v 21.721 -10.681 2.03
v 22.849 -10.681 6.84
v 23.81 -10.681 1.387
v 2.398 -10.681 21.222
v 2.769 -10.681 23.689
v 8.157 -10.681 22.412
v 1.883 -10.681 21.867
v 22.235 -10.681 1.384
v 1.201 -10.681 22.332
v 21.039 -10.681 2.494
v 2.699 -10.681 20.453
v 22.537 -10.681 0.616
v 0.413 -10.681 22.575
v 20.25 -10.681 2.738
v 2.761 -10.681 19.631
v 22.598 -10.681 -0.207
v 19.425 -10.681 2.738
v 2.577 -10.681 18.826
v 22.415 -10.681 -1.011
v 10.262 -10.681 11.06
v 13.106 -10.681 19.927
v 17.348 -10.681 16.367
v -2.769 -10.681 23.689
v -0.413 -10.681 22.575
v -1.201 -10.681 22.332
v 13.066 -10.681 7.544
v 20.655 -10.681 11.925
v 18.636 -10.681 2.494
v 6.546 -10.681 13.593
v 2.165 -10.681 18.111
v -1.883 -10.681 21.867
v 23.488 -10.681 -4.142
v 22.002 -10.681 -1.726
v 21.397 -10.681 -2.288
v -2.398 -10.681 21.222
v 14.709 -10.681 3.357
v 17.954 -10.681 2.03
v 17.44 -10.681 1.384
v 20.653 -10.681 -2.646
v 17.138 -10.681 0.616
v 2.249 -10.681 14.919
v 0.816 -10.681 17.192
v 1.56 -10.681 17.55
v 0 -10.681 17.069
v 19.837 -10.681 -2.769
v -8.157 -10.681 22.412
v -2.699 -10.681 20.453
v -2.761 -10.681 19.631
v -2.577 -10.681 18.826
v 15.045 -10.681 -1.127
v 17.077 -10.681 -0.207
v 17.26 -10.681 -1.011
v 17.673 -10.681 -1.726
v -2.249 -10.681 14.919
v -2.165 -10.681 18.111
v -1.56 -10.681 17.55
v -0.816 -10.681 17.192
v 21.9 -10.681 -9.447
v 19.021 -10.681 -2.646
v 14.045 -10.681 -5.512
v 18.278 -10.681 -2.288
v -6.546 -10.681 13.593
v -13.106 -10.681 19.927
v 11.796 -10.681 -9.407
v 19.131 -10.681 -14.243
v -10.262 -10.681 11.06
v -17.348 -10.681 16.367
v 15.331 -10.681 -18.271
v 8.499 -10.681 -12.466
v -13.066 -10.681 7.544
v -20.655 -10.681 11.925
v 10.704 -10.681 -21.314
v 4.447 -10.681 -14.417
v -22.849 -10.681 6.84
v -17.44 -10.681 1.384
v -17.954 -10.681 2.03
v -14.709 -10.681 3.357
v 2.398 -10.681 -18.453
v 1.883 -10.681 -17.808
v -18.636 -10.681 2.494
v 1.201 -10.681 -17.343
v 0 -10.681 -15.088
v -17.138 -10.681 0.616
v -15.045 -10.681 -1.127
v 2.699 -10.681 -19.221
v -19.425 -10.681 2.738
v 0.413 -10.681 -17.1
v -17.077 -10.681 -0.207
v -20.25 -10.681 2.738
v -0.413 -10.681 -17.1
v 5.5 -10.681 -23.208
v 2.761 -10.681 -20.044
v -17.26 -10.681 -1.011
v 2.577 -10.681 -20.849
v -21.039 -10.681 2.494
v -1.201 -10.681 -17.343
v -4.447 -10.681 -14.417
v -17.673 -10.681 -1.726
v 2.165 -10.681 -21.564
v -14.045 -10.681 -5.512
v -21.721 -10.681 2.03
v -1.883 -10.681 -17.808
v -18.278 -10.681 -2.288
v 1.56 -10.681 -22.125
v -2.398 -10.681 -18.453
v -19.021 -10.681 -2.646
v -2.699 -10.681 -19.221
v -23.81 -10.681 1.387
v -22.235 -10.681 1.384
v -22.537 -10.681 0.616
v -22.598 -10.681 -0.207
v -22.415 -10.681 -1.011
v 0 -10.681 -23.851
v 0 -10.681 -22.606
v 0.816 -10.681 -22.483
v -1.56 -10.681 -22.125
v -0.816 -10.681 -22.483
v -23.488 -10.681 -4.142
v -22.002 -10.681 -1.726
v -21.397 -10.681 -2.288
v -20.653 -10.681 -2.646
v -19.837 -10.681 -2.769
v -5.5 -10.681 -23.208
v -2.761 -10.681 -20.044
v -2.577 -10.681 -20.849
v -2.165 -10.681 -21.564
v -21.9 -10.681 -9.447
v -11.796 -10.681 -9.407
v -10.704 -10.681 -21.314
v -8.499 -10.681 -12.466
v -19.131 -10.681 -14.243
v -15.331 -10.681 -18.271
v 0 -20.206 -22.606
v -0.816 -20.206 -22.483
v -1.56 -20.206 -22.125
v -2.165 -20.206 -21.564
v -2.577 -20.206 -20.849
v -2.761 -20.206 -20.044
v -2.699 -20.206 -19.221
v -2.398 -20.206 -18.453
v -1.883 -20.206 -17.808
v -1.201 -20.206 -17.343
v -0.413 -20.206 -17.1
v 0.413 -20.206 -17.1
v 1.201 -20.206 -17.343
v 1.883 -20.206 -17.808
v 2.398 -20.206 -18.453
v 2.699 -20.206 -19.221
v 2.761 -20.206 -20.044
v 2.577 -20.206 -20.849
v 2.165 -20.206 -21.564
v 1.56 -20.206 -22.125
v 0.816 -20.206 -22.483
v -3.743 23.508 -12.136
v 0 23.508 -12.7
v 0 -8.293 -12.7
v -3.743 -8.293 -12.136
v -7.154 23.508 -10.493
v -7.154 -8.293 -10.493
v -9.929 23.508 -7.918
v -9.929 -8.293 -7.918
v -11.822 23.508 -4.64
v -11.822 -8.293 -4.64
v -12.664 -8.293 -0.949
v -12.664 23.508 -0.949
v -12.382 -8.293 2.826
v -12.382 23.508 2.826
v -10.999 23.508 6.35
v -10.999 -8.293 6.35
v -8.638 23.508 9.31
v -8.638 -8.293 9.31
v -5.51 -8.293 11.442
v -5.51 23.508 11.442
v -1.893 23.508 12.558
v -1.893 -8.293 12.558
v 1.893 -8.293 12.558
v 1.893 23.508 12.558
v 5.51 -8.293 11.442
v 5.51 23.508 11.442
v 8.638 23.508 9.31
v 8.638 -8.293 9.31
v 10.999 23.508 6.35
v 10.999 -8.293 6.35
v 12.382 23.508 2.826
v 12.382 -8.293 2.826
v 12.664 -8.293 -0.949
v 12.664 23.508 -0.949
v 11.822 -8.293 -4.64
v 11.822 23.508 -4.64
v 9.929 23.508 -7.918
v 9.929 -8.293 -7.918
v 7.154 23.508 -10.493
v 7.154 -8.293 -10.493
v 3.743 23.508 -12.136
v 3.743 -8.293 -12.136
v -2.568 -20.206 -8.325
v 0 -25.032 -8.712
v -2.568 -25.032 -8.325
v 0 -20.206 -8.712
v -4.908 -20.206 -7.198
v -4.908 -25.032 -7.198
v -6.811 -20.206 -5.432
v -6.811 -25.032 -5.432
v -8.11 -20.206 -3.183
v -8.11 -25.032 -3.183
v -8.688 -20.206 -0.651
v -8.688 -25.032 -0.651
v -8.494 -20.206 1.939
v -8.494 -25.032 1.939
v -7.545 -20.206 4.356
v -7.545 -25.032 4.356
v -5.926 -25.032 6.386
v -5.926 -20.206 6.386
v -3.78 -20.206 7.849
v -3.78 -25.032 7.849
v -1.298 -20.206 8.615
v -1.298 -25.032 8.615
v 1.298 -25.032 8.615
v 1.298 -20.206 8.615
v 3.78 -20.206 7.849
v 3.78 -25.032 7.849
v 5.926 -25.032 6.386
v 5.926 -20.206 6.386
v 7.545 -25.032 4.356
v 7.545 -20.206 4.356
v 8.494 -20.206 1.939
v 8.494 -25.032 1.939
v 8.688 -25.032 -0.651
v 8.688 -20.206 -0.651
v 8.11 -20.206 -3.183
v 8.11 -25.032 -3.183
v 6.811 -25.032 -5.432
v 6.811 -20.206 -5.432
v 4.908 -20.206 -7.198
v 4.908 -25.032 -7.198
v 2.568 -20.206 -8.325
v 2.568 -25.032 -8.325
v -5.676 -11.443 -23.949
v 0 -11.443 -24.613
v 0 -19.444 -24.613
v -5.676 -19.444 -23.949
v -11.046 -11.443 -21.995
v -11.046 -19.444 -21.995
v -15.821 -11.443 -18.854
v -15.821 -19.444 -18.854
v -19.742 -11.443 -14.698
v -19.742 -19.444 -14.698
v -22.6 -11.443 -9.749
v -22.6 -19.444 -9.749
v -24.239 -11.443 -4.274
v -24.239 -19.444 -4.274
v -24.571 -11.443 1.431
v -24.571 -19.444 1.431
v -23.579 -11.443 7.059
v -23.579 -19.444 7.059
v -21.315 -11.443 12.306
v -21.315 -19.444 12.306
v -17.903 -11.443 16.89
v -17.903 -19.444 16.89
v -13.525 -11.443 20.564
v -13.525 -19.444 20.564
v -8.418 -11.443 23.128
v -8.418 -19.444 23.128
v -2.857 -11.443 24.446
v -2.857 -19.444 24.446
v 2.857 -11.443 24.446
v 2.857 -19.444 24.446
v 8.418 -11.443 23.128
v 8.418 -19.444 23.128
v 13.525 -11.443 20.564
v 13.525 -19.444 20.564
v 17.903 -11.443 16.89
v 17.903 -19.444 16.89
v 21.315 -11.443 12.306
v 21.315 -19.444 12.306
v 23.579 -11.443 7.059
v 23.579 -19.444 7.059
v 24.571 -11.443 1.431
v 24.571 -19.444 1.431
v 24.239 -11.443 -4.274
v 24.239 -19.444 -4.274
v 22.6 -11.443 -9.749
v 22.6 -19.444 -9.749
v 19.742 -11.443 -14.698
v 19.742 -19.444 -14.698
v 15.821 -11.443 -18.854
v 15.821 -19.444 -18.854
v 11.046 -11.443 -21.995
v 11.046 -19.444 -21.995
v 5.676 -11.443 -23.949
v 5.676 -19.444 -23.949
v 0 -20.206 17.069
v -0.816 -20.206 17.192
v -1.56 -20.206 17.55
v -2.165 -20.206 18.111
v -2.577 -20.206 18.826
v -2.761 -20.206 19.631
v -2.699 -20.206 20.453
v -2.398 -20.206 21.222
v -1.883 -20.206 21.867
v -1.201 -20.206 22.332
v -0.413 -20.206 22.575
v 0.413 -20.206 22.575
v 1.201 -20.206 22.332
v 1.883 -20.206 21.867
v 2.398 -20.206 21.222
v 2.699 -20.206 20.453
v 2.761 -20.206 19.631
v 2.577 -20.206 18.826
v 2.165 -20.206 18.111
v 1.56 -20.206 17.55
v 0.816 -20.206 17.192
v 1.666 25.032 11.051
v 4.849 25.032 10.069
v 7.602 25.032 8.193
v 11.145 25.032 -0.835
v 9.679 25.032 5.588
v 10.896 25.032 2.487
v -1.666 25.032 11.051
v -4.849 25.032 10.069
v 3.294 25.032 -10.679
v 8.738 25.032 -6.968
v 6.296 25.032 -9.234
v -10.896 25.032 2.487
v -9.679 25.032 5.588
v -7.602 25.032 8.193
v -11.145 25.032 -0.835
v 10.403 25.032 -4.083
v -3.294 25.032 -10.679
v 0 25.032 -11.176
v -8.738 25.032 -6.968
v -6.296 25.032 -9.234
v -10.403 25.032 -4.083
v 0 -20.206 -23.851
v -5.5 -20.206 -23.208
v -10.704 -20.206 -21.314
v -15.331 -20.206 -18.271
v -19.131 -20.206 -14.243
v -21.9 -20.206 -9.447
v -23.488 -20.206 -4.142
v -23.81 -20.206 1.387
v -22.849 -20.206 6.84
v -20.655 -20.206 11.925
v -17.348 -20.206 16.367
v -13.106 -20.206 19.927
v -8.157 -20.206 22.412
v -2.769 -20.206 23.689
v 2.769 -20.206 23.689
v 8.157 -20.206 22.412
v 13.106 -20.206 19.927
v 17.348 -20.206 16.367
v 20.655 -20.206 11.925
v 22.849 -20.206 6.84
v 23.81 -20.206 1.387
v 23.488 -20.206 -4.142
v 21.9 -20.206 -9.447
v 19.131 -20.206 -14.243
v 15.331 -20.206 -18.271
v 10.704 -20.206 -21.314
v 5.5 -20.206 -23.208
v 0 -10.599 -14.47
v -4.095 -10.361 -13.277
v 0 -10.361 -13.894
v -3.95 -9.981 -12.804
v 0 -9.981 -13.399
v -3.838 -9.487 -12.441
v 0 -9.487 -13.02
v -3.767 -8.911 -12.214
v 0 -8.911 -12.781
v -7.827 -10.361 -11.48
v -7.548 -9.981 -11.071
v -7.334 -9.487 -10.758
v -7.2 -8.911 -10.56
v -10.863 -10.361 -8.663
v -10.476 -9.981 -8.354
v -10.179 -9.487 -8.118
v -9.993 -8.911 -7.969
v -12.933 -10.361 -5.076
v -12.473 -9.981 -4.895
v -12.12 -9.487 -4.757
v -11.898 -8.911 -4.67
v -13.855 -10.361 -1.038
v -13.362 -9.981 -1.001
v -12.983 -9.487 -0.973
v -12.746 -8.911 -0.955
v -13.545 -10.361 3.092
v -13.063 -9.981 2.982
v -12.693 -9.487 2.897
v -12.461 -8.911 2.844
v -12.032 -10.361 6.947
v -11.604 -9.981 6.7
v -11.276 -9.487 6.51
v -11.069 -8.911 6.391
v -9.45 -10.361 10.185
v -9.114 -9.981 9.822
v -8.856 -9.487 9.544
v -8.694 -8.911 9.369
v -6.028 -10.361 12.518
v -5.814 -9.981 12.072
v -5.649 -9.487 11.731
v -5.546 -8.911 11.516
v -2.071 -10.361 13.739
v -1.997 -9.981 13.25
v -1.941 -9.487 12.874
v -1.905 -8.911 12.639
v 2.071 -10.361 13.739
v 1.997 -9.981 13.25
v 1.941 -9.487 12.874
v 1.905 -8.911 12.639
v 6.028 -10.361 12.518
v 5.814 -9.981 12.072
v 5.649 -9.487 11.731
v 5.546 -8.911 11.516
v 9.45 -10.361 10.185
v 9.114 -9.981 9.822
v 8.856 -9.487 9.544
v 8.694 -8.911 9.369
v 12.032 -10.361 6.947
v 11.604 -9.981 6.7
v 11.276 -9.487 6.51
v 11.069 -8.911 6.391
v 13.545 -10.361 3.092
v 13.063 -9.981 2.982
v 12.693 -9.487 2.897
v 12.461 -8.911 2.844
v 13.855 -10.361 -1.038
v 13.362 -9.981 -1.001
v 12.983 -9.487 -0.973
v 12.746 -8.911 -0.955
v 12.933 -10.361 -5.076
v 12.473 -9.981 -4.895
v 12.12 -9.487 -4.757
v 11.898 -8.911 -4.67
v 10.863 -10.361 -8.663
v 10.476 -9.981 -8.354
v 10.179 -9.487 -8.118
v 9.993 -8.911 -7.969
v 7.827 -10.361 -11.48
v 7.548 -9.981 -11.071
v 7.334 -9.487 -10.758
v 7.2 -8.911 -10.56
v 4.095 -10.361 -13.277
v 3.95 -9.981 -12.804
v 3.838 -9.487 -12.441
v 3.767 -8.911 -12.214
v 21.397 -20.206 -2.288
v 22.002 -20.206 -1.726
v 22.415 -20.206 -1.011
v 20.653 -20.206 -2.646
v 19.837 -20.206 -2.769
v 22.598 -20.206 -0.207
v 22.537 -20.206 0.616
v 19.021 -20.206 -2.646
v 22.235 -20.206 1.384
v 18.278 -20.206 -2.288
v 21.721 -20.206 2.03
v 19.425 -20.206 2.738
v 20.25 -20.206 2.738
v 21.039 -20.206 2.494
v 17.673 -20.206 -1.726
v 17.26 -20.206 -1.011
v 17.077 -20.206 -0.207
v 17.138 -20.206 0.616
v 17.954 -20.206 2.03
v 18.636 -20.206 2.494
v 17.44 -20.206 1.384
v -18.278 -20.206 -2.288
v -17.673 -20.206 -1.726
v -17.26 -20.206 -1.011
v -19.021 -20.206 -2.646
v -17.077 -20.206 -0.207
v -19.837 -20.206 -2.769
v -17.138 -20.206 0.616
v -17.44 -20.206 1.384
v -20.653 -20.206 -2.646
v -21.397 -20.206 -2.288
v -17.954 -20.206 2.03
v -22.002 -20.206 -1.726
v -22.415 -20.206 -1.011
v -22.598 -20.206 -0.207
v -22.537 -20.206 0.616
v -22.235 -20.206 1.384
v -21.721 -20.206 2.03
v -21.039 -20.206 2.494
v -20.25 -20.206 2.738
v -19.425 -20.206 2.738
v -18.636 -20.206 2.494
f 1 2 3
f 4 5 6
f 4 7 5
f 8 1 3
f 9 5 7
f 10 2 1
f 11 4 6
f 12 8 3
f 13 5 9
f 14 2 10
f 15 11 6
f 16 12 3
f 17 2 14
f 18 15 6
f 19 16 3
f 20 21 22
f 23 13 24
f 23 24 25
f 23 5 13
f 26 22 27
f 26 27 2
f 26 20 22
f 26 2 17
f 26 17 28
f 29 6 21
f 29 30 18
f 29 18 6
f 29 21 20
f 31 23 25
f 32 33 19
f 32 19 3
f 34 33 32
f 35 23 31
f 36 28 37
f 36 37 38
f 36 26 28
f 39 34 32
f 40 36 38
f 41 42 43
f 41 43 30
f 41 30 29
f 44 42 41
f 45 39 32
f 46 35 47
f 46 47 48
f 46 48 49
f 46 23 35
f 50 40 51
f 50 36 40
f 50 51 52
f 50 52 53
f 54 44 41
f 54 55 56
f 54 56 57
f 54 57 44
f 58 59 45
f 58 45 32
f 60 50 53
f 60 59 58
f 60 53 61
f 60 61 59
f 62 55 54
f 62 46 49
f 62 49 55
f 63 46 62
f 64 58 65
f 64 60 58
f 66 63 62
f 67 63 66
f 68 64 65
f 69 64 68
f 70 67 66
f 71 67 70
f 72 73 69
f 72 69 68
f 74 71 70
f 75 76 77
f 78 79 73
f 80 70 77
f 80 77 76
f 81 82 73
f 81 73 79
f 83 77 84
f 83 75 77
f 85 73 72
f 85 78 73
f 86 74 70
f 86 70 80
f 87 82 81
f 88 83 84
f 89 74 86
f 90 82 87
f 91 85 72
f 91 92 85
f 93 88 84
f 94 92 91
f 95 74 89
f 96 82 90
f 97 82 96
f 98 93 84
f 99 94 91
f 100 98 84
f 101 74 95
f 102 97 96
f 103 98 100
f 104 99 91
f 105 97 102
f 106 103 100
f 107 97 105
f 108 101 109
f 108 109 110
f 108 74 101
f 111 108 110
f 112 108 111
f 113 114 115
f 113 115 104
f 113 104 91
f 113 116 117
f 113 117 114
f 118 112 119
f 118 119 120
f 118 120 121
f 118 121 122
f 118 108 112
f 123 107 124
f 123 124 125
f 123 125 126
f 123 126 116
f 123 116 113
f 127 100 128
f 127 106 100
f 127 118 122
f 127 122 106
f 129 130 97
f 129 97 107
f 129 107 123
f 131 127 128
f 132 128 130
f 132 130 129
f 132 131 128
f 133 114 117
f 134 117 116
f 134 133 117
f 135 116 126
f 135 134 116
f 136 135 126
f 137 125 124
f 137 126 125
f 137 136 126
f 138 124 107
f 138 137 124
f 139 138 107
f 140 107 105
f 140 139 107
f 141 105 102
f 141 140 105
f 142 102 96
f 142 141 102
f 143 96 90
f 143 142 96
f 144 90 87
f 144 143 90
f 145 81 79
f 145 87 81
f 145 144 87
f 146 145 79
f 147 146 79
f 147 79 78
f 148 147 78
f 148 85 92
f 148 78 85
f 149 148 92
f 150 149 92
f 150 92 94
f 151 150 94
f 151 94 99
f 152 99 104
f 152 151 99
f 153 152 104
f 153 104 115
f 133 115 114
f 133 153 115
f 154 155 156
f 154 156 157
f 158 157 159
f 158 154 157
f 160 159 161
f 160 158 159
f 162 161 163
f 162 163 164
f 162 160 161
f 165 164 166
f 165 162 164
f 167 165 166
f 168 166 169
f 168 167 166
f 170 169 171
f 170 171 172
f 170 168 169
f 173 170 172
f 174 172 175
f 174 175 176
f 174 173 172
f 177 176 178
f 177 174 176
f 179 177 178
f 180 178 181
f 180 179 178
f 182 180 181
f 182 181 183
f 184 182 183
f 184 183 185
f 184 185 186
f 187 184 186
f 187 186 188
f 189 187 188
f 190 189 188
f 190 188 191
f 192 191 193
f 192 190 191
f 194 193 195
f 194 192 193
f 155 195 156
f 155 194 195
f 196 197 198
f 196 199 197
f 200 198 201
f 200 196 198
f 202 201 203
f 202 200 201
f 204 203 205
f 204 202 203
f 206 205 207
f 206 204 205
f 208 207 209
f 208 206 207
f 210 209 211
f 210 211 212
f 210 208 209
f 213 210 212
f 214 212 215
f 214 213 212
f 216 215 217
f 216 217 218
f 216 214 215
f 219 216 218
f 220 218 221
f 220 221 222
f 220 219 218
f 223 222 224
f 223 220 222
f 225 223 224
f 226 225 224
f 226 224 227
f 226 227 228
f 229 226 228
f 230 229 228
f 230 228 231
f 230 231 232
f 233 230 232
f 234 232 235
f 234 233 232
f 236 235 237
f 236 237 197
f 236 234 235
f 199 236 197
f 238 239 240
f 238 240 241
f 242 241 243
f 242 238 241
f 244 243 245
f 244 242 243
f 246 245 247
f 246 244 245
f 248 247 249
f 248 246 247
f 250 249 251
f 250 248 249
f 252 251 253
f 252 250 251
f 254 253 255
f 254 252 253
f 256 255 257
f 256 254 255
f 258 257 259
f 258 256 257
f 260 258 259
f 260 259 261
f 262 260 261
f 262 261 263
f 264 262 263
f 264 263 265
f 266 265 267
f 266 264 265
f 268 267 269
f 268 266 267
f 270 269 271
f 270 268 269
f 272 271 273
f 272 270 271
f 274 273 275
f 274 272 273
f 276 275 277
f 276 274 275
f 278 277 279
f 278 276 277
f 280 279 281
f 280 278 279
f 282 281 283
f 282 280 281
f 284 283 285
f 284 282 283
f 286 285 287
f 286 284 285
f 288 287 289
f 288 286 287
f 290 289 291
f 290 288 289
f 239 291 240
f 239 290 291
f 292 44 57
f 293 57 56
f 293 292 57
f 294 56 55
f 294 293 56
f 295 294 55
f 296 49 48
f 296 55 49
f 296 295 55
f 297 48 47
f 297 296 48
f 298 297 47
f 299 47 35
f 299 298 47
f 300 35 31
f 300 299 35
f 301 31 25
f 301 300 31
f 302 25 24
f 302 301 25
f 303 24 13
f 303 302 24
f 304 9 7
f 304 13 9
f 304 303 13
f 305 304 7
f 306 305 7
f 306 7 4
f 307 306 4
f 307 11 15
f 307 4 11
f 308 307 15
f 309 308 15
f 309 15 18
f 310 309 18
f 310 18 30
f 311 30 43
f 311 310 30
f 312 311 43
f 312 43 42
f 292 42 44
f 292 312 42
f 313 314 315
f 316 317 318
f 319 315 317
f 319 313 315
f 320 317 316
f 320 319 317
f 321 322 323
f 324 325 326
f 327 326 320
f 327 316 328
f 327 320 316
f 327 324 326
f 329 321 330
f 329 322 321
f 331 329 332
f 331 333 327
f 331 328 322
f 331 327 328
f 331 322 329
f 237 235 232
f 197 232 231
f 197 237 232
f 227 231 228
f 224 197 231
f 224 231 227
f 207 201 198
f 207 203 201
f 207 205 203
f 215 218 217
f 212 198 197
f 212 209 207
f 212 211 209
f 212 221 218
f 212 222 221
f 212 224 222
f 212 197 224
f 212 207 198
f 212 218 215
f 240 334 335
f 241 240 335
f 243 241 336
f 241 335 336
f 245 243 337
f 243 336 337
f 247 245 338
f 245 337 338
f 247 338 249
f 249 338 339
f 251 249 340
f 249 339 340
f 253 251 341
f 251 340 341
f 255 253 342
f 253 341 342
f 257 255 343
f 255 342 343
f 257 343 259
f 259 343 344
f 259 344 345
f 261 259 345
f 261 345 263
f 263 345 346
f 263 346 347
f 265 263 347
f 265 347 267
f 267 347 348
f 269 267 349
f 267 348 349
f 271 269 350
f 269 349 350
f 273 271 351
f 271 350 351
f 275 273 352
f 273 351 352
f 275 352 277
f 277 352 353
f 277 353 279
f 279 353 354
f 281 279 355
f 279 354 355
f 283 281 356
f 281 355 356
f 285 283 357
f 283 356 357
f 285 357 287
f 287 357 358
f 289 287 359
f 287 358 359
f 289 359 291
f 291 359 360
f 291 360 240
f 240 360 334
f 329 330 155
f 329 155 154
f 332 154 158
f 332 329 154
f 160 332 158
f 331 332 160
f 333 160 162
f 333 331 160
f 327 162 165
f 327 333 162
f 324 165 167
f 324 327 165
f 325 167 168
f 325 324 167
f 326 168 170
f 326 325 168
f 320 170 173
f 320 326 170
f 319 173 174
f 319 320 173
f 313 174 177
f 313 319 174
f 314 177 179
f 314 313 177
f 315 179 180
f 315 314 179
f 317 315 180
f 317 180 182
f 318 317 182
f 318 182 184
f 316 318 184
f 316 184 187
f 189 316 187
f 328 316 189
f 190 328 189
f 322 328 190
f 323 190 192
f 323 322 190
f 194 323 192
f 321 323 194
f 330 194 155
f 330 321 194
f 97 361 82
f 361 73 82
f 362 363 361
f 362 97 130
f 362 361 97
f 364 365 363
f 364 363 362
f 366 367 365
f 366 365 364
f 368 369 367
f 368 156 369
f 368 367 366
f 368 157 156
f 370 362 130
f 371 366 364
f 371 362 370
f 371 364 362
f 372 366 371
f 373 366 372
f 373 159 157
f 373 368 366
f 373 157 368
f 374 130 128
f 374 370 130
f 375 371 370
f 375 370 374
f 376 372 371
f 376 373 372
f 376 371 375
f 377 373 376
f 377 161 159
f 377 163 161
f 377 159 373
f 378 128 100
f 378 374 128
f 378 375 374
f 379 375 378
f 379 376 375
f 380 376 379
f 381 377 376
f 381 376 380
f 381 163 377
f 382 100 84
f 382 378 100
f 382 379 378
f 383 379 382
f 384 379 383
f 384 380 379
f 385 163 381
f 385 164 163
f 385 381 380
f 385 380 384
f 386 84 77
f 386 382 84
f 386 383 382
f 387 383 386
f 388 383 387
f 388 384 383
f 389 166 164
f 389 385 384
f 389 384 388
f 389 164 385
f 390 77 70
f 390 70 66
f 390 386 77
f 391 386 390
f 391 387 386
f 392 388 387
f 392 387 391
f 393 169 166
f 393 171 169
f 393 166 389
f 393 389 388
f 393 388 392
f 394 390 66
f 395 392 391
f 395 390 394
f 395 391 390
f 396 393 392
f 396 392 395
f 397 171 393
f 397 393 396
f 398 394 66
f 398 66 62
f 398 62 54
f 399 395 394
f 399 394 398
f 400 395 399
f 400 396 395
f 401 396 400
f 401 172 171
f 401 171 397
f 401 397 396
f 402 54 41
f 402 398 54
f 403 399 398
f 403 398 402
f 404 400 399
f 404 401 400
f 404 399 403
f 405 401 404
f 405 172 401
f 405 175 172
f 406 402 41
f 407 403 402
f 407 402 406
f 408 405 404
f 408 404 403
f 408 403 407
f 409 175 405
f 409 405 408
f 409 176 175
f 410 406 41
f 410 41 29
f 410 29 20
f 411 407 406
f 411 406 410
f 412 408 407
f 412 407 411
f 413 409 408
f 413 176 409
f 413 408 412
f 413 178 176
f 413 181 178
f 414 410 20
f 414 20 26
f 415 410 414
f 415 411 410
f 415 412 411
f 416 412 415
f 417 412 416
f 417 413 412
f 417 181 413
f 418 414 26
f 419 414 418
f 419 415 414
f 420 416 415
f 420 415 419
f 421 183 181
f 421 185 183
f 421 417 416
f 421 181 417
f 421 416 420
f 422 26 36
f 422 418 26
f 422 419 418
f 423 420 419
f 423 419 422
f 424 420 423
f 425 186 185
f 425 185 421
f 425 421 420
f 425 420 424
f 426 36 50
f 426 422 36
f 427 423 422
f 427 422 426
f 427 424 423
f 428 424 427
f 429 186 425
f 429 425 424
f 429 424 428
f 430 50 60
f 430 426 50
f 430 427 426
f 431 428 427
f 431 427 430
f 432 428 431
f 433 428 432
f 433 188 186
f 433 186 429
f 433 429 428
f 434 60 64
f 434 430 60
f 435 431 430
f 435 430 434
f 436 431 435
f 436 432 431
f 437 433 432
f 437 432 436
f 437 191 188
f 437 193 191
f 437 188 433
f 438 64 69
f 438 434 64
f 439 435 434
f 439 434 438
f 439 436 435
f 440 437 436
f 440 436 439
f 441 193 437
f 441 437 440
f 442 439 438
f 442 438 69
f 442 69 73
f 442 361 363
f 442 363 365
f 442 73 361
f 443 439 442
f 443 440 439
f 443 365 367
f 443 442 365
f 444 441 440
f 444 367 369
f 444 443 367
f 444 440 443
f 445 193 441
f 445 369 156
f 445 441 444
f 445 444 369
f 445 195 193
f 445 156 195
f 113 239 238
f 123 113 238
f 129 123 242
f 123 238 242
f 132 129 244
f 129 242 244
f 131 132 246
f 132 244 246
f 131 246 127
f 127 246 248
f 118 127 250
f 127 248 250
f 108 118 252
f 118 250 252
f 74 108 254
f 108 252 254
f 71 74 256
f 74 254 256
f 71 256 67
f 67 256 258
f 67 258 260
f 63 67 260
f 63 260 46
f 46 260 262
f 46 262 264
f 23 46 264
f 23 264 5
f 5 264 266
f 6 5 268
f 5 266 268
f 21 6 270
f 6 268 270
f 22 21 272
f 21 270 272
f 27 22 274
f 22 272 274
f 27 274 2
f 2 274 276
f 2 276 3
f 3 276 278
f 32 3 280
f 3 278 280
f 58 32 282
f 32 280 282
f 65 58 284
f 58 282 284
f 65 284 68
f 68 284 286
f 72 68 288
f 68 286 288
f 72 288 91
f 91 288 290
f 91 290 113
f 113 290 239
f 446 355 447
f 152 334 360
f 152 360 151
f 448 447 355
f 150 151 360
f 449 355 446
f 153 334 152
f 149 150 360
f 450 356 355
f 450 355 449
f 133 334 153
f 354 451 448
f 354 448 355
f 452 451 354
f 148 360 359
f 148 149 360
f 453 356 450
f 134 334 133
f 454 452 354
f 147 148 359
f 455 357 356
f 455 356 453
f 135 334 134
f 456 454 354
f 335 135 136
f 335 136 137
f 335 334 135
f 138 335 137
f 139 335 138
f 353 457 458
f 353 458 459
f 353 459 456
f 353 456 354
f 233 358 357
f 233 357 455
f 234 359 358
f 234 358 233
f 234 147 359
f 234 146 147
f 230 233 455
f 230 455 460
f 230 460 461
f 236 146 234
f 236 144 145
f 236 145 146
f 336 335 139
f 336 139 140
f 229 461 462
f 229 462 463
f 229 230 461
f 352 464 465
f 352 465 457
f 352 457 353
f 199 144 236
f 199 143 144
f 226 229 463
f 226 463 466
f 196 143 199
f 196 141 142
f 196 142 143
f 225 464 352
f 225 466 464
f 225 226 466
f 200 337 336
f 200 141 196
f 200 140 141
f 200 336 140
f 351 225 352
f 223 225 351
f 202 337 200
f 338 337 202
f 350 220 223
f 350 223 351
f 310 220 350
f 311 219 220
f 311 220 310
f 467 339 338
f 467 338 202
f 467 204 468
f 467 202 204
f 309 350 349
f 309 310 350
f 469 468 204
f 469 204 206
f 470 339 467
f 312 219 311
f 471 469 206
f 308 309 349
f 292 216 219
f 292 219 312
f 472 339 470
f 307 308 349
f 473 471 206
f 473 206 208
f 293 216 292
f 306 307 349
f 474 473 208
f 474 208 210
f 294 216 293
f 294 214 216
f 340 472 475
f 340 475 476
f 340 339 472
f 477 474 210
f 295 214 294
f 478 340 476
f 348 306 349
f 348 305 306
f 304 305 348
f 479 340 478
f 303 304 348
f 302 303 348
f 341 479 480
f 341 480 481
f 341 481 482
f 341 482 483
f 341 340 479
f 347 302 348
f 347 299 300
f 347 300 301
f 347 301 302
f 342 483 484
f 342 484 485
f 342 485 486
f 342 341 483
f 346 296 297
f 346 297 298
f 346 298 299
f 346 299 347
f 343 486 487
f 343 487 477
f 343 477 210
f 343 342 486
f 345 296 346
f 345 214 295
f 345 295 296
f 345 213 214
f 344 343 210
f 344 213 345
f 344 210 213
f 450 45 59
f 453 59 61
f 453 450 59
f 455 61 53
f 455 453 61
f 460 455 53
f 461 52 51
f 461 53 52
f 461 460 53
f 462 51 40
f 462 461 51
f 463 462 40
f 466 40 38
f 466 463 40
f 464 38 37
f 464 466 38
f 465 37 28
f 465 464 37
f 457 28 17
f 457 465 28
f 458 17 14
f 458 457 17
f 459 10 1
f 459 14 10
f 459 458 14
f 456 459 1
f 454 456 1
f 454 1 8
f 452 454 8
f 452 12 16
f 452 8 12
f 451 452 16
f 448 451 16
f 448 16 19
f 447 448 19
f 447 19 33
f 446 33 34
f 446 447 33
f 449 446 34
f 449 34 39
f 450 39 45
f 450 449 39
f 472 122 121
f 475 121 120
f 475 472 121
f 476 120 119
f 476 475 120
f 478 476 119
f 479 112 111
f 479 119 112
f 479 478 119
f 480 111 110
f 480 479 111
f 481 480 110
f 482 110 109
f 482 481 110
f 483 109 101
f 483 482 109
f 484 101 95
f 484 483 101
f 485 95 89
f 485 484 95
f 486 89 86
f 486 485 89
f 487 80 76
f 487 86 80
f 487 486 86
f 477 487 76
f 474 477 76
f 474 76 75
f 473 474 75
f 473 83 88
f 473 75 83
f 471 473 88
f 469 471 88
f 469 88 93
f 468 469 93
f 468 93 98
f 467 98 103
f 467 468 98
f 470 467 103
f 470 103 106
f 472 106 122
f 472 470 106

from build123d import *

# Parameters (mm, degrees)
CUT_EXTRUDE2_START = -20.2057
SKETCH2_R          = 2.7686
CUT_EXTRUDE2_DEPTH = 20.2057
FILLET1_R          = 2.3876
CHAMFER1_SIZE      = 0.762
CHAMFER2_SIZE      = 1.524


with BuildPart() as part:
    # Sketch1 → Revolve1 (revolve)
    with BuildSketch(Plane(origin=(0, 0, 0), x_dir=(0, 1, 0), z_dir=(0, 0, 1)), mode=Mode.PRIVATE) as revolve1_sk:
        Polygon((-25.0317, 0), (-25.0317, 8.7122), (-20.2057, 8.7122), (-20.2057, 24.6126), (-10.6807, 24.6126), (-10.6807, 12.7), (25.0317, 12.7), (25.0317, 0), align=None)
    revolve(revolve1_sk.sketch.rotate(Axis((0, -50.4317, 0), (0, 1, 0)), 270), axis=Axis((0, -50.4317, 0), (0, 1, 0)))

    # Sketch2 → Cut-Extrude2 (cut)
    with BuildSketch(Plane(origin=(0, 0, 0), x_dir=(-1, 0, 0), z_dir=(0, 1, 0)).offset(CUT_EXTRUDE2_START)):
        with Locations(Location((19.8374, 0, 0), (0, 0, 270))):
            Circle(SKETCH2_R)
        with Locations(Location((0, 19.8374, 0), (0, 0, 270))):
            Circle(SKETCH2_R)
        with Locations(Location((-19.8374, 0, 0), (0, 0, 270))):
            Circle(SKETCH2_R)
        with Locations(Location((0, -19.8374, 0), (0, 0, 270))):
            Circle(SKETCH2_R)
    extrude(amount=CUT_EXTRUDE2_DEPTH, mode=Mode.SUBTRACT)

    # Fillet1
    fillet1_edges = [part.edges().sort_by_distance(p)[0] for p in [
        (0, -10.6807, 12.7),
    ]]
    fillet(fillet1_edges, radius=FILLET1_R)

    # Chamfer1
    chamfer1_edges = [part.edges().sort_by_distance(p)[0] for p in [
        (0, -10.6807, 24.6126),
        (0, -20.2057, 24.6126),
    ]]
    chamfer(chamfer1_edges, length=CHAMFER1_SIZE)

    # Chamfer2
    chamfer2_edges = [part.edges().sort_by_distance(p)[0] for p in [
        (0, 25.0317, 12.7),
    ]]
    chamfer(chamfer2_edges, length=CHAMFER2_SIZE)


solid = part.part
